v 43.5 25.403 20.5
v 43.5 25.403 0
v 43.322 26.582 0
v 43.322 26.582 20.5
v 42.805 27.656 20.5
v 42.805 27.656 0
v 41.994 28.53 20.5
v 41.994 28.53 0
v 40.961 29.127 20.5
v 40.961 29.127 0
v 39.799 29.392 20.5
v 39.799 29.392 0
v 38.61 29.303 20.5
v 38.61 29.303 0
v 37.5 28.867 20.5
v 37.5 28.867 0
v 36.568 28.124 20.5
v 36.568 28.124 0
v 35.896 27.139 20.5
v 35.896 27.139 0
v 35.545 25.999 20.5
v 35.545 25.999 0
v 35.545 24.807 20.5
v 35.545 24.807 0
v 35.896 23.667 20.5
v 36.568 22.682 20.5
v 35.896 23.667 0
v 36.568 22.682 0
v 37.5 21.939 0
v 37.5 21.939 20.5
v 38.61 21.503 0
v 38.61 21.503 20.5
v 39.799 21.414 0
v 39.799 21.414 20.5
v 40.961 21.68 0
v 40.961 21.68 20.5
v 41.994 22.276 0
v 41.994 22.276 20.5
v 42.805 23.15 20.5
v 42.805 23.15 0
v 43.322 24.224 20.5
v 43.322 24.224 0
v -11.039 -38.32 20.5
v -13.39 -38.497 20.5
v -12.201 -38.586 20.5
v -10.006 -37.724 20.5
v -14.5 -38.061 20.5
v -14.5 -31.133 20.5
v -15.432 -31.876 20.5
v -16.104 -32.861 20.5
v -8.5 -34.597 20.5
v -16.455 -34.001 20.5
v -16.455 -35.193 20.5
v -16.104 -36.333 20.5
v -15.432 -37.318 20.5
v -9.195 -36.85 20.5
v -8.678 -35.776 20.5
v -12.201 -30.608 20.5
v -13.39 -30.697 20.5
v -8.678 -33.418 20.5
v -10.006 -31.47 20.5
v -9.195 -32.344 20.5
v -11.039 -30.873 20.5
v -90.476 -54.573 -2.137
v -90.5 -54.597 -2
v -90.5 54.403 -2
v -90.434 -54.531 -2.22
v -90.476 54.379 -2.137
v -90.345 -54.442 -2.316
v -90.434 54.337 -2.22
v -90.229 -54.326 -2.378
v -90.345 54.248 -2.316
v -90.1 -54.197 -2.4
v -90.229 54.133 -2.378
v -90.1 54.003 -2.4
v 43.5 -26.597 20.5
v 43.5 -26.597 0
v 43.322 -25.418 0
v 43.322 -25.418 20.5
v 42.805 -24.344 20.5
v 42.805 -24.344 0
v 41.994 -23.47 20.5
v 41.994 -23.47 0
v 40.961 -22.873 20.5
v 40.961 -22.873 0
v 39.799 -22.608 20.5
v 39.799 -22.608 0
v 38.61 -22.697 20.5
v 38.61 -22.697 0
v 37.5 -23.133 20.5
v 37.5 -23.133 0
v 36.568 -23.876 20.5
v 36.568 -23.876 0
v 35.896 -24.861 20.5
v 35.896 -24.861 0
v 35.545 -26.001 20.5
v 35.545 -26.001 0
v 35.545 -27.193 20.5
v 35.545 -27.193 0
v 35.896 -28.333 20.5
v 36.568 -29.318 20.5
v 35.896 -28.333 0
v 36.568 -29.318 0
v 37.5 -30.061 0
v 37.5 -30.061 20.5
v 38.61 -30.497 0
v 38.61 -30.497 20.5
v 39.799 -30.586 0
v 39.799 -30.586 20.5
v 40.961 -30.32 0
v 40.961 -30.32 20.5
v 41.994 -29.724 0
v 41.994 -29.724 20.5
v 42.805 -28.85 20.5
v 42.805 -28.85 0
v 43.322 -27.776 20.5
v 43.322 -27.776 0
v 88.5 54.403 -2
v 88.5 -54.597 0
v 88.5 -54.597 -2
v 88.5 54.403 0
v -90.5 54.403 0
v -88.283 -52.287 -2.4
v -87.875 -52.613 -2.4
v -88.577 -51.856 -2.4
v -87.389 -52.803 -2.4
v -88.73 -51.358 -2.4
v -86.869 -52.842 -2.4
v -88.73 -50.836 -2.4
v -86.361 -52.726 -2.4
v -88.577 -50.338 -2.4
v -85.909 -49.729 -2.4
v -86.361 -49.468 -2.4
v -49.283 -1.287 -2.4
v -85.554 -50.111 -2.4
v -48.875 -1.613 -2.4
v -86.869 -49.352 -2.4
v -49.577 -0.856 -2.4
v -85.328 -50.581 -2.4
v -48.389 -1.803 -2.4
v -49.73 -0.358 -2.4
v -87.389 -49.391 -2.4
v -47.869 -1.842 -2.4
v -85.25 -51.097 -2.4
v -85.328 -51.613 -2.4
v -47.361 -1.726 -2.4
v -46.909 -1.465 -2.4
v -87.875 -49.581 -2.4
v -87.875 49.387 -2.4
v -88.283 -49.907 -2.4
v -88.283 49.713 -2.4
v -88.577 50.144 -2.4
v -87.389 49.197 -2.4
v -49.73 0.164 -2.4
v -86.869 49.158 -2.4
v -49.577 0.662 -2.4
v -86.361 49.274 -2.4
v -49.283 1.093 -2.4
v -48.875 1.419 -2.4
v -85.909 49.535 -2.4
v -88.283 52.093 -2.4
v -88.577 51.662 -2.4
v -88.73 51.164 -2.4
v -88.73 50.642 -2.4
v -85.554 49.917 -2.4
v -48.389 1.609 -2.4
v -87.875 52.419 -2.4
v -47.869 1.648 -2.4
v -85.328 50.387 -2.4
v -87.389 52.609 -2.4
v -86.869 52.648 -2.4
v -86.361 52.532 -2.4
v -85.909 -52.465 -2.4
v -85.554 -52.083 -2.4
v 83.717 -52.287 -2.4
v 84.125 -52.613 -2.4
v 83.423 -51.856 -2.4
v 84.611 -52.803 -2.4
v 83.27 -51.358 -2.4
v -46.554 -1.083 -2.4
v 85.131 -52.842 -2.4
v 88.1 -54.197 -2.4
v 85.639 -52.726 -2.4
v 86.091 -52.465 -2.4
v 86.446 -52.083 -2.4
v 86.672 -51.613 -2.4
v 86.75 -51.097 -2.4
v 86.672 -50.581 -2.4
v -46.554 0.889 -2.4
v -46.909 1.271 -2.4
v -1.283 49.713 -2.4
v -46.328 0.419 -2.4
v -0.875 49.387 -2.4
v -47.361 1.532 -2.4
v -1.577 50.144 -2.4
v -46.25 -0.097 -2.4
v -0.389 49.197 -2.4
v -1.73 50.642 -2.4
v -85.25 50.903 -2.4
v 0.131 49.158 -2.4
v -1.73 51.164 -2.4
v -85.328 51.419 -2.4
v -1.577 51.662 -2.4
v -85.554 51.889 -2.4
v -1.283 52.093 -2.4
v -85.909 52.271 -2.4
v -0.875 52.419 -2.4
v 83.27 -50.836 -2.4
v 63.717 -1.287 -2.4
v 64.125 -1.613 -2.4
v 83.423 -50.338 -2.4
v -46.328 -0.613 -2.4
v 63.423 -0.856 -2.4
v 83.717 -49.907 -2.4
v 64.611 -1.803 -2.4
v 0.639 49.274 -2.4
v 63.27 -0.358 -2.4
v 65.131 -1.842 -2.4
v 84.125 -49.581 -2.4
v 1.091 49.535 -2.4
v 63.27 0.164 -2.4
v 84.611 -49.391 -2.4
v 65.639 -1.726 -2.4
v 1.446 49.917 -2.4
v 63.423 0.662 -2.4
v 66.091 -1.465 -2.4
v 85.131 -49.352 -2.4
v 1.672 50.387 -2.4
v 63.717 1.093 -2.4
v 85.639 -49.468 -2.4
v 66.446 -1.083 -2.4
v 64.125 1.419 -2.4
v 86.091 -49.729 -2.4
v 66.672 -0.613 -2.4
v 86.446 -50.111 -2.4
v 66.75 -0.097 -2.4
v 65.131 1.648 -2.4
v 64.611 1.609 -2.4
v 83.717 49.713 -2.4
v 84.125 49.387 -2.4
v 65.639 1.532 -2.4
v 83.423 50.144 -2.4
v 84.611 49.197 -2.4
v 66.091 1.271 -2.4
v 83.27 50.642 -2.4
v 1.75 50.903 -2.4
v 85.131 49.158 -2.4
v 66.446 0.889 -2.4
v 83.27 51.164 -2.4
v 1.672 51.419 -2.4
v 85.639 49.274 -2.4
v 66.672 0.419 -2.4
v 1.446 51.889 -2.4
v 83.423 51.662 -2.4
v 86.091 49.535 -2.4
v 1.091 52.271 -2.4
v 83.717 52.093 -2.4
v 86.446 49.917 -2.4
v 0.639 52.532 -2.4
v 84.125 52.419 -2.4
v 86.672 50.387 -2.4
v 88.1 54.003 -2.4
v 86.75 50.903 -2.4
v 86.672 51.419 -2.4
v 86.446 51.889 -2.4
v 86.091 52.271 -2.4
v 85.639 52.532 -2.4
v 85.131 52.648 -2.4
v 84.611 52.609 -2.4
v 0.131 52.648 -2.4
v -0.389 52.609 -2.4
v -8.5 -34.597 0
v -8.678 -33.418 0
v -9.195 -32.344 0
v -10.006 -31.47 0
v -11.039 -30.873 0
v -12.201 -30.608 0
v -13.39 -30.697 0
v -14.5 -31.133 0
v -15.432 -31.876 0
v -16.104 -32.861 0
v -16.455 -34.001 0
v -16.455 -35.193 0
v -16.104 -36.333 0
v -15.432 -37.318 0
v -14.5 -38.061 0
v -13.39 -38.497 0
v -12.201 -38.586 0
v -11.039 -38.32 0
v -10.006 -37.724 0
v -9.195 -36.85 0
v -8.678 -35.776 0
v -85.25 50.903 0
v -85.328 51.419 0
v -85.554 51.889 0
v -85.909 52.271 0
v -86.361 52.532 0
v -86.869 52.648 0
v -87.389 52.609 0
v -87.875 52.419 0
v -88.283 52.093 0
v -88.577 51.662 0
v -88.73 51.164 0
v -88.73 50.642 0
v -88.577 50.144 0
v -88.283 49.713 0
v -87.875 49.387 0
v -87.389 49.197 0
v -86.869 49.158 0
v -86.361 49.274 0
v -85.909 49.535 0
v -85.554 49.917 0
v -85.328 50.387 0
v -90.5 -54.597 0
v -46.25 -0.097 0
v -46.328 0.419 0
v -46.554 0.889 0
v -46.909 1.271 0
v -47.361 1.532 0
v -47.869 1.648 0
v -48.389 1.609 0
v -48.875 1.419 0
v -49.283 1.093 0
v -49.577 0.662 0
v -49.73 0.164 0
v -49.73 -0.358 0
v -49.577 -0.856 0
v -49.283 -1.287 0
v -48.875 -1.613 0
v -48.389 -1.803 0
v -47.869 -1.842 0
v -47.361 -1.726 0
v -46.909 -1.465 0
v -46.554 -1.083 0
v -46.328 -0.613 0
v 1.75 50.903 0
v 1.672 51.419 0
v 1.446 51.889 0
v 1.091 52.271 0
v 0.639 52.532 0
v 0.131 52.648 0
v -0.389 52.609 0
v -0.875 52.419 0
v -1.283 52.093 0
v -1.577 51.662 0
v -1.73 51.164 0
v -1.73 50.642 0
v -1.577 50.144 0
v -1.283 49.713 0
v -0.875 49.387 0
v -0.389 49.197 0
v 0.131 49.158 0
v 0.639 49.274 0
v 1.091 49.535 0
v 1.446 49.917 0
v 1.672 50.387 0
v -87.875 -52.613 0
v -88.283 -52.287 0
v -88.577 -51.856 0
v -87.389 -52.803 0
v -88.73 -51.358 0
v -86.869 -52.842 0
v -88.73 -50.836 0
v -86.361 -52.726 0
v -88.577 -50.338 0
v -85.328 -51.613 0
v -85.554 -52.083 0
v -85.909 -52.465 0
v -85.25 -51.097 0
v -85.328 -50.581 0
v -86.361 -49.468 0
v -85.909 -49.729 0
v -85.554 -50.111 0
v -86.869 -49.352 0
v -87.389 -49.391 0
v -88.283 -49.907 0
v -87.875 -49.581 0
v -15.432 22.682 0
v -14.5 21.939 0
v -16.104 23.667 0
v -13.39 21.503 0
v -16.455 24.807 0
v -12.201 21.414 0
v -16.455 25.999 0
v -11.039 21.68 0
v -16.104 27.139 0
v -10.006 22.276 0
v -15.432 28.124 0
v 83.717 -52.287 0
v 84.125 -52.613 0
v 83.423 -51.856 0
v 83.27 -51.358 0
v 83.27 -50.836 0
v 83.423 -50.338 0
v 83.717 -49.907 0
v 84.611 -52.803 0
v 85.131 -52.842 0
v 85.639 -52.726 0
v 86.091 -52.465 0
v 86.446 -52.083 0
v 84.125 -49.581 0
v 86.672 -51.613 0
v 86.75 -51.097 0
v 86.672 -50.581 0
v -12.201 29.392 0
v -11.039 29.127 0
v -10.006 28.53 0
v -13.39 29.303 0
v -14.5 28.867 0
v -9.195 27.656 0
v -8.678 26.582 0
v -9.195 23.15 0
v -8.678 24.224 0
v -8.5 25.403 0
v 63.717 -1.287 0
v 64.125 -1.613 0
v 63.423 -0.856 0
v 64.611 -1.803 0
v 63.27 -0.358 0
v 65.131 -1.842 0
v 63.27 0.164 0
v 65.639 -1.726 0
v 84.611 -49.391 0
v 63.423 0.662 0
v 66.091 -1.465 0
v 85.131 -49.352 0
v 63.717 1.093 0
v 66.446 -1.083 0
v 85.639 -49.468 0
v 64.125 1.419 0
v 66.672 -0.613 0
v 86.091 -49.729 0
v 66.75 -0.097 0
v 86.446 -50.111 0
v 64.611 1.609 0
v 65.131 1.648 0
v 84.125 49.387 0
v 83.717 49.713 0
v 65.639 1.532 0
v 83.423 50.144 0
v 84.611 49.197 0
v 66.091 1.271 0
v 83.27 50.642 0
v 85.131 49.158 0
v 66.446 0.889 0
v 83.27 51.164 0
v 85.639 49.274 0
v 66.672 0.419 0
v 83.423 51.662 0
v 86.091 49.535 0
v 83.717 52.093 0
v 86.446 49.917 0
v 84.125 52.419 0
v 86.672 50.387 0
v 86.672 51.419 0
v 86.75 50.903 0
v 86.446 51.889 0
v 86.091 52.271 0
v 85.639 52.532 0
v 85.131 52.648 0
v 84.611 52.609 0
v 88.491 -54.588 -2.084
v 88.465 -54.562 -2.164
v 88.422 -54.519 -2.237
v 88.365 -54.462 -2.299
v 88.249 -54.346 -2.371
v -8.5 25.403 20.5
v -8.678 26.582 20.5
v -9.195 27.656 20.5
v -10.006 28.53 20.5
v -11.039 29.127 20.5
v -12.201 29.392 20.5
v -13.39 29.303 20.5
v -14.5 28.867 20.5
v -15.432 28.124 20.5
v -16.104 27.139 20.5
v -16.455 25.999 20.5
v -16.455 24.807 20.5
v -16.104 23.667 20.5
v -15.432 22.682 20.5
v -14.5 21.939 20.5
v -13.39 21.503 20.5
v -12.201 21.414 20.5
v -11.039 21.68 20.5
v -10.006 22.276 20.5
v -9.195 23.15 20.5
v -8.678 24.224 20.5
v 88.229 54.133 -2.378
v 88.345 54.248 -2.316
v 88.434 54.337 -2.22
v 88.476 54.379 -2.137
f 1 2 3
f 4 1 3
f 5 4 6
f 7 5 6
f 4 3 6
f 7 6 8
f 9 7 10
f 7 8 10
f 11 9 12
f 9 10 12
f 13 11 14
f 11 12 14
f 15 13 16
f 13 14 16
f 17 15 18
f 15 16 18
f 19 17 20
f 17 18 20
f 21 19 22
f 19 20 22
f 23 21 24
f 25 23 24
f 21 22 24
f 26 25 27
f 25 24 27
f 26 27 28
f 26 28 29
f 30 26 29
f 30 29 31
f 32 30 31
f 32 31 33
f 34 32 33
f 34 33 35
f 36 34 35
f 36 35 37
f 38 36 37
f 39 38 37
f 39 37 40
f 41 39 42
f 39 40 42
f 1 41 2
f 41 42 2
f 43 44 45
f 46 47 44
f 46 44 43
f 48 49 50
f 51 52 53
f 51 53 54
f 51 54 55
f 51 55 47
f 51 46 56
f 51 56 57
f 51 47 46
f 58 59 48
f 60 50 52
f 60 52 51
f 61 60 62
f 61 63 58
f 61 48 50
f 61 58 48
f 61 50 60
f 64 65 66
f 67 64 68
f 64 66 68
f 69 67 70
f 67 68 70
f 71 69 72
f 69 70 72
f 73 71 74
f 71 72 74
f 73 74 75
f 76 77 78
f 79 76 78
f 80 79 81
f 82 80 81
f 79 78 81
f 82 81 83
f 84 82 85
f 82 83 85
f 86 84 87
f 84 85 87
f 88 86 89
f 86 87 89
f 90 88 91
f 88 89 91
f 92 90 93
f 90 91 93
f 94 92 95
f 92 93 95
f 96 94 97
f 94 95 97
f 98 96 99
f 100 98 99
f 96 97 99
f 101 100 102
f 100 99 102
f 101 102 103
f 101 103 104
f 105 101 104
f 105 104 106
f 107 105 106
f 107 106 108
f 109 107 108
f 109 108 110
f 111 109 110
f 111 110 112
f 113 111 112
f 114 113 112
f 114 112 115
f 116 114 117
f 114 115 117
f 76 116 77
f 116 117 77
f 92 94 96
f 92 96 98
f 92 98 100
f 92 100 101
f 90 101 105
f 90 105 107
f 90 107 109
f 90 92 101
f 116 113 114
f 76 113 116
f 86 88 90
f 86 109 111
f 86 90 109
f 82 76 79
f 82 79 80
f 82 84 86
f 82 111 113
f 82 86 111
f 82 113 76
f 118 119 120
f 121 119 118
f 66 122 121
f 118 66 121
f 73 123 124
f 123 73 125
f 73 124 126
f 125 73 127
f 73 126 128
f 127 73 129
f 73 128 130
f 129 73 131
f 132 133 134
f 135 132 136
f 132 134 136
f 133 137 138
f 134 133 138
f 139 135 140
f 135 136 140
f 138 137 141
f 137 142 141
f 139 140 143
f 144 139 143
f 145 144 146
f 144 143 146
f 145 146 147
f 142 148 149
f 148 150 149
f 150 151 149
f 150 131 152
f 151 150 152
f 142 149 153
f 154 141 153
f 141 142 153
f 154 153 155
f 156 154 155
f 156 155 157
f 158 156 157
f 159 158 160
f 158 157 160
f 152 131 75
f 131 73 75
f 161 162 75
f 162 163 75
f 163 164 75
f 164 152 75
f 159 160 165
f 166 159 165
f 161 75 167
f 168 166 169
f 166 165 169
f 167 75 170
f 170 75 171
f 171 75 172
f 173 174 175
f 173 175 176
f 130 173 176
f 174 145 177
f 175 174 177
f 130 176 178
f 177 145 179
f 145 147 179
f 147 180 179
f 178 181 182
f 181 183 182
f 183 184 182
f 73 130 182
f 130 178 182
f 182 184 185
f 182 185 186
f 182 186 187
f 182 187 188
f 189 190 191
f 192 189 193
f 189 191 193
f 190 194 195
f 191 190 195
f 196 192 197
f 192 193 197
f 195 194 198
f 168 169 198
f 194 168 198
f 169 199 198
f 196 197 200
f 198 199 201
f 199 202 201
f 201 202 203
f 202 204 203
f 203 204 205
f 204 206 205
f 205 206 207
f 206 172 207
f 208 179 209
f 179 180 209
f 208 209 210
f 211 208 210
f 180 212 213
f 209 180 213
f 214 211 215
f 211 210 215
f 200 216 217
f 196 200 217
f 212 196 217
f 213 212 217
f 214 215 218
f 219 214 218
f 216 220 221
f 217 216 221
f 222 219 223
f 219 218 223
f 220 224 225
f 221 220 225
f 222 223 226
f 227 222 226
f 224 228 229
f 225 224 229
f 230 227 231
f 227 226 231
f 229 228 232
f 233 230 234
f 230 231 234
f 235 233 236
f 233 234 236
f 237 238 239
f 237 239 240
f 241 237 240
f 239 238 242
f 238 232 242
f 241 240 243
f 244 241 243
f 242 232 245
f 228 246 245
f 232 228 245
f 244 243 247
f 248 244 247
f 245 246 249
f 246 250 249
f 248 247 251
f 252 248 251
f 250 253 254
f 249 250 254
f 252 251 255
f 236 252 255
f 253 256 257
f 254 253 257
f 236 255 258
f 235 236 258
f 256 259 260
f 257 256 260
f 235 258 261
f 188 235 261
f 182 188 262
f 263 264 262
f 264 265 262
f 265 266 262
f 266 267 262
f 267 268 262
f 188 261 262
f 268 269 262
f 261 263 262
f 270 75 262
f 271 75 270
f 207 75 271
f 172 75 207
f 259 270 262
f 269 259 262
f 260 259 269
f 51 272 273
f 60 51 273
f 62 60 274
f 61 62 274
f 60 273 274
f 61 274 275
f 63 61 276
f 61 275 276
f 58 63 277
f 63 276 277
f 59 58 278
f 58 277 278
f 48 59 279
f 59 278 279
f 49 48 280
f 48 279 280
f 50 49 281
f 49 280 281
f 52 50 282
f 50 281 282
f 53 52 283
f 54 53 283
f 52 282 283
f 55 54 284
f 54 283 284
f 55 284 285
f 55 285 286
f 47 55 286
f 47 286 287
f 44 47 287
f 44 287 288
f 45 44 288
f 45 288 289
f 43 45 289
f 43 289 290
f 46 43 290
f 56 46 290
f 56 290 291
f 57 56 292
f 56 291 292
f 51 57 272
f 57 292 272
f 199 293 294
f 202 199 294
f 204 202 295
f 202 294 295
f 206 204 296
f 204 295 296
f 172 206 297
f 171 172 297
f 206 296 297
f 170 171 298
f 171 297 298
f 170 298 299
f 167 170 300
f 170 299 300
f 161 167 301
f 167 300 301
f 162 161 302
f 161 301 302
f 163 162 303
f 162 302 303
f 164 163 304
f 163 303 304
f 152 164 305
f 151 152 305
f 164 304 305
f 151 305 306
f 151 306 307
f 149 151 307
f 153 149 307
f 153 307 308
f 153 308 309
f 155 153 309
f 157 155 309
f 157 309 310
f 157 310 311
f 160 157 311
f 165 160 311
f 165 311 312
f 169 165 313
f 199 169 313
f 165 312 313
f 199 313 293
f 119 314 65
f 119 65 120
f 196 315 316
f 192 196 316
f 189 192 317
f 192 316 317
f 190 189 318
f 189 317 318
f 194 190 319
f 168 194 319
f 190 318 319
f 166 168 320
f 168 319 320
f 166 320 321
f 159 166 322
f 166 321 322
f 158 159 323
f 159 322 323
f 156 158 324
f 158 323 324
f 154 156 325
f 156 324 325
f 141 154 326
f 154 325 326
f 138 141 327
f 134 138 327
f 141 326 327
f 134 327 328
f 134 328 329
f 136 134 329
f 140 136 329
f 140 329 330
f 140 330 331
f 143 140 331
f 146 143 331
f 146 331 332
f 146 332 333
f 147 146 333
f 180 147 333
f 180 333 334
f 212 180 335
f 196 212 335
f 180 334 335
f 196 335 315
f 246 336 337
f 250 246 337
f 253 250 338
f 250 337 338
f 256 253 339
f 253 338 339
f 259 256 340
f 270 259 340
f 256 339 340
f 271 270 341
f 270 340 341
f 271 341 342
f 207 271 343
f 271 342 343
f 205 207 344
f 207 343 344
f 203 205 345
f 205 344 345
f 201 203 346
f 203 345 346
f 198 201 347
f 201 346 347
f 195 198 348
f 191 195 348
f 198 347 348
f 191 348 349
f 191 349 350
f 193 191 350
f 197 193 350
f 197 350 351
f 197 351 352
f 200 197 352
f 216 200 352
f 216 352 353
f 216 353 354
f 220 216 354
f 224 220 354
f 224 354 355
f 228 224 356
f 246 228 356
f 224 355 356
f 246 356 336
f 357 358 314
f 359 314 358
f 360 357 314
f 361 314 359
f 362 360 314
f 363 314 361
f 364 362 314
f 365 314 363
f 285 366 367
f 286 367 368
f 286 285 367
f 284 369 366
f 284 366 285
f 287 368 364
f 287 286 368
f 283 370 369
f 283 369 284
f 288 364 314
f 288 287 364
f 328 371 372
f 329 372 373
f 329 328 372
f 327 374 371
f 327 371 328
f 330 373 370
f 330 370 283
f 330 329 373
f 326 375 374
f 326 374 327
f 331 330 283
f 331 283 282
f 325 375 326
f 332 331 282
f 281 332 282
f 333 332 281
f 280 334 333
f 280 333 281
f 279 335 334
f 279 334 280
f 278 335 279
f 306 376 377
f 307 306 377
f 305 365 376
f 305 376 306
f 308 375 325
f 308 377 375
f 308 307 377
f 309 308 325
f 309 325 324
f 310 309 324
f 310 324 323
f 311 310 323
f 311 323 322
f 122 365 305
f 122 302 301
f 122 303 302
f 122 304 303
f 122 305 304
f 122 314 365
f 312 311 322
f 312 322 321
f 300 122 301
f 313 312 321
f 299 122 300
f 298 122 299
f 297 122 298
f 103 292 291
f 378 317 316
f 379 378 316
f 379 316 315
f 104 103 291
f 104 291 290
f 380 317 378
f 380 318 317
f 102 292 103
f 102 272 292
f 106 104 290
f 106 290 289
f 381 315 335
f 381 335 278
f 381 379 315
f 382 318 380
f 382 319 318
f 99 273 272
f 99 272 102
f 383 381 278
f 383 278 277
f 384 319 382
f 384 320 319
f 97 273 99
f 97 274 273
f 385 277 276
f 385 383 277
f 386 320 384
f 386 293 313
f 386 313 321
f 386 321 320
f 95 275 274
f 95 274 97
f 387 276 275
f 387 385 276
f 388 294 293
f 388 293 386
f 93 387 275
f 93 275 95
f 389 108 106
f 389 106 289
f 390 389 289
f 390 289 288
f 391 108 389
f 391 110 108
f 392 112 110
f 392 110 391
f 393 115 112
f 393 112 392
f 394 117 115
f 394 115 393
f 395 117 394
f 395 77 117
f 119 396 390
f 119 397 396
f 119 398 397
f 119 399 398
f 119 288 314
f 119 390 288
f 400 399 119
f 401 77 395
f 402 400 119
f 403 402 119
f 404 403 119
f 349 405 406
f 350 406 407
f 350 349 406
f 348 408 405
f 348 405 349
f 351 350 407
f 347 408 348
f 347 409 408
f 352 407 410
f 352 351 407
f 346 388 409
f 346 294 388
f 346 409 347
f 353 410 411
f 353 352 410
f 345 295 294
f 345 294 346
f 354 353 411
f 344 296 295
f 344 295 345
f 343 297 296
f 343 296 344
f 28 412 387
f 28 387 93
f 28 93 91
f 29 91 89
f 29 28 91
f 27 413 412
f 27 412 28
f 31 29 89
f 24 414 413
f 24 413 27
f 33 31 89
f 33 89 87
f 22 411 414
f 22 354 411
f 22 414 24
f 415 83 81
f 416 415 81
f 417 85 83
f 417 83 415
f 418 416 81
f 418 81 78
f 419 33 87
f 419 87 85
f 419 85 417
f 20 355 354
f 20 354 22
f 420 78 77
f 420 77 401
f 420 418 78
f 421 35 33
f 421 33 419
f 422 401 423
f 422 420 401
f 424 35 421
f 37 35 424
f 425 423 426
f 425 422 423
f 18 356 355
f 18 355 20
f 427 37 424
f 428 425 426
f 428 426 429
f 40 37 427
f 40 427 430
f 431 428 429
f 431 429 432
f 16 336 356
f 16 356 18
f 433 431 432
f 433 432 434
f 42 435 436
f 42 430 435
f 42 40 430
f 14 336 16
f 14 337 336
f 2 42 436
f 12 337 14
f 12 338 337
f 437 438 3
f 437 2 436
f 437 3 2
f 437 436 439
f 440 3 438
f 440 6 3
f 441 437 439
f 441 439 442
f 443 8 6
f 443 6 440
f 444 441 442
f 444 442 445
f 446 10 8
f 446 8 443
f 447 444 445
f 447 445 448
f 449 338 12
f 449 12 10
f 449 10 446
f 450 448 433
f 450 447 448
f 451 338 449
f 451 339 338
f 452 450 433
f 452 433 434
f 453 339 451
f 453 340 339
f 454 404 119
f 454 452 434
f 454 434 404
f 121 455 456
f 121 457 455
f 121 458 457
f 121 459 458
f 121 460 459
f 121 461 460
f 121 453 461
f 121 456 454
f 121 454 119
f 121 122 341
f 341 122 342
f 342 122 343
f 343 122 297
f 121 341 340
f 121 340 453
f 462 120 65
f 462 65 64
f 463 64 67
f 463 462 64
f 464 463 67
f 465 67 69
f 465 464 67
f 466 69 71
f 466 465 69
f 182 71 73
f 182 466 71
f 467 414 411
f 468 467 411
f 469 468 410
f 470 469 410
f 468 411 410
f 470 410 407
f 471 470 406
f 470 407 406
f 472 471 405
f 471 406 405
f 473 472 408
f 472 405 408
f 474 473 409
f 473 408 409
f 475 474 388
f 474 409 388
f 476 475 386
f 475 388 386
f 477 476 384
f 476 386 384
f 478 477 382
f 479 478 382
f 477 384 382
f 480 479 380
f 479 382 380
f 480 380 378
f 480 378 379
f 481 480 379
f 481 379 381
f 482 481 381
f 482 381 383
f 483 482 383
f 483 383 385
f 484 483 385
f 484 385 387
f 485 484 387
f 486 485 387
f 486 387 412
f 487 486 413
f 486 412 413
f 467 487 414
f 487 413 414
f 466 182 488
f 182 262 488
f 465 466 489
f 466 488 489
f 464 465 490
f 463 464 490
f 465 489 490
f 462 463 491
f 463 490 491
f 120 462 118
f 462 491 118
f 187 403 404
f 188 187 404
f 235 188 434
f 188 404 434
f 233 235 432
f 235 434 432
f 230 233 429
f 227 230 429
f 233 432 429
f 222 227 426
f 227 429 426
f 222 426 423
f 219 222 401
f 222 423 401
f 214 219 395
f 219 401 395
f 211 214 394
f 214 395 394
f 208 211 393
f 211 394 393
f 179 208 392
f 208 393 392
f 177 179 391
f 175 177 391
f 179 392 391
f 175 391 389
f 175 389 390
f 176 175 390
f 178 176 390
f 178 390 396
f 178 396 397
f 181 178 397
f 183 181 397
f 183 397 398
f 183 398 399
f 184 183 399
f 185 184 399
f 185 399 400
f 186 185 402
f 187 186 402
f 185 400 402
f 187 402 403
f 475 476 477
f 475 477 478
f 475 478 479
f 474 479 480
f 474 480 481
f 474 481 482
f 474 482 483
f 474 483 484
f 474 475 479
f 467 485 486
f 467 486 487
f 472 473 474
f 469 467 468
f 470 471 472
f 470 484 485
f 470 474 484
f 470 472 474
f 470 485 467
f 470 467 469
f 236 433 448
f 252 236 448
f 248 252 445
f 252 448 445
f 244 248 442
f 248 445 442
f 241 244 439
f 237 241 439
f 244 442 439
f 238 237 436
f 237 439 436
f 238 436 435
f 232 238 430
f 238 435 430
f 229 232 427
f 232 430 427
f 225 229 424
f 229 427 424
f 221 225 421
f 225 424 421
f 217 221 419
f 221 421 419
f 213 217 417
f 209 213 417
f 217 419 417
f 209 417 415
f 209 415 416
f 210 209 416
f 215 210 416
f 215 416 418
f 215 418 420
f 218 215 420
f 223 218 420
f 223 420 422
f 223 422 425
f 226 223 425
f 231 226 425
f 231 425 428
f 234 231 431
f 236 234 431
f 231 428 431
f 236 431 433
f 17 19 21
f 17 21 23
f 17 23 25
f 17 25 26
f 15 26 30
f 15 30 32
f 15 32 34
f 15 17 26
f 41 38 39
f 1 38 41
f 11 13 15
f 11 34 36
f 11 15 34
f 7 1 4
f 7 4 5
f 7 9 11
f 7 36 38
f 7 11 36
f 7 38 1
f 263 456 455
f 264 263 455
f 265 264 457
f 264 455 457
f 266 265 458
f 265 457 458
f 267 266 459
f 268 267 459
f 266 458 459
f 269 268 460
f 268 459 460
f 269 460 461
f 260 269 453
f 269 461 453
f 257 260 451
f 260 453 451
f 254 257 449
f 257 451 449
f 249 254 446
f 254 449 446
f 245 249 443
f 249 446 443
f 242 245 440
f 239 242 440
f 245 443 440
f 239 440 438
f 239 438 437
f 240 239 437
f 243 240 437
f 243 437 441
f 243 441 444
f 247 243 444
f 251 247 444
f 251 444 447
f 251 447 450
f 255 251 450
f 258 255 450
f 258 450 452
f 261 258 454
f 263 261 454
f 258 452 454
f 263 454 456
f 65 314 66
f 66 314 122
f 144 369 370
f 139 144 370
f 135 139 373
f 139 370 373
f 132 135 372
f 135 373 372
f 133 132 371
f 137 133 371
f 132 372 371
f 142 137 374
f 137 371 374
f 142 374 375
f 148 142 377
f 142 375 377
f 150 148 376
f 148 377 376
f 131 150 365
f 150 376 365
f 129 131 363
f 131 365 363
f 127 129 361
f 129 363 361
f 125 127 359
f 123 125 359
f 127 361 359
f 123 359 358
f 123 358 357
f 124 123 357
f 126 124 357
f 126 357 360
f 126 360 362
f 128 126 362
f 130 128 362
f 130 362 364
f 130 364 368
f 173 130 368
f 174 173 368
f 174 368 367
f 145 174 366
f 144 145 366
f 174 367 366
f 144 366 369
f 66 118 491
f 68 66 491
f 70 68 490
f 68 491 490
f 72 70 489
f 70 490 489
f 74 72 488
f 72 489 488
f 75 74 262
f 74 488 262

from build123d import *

# Parameters (mm, degrees)
F0_W     = 179
F0_H     = 109
F0_R     = 1.75
F0_R_2   = 4
F1_DEPTH = 2.4
F2_DEPTH = 20.5
F3_R     = 0.4


with BuildPart() as f1:
    # F0 (on Top) → F1 (new body)
    with BuildSketch(Plane.XY):
        with Locations((-1, -0.096982)):
            Rectangle(F0_W, F0_H)
        with Locations((-87, -51.096982)):
            Circle(F0_R, mode=Mode.SUBTRACT)
        with Locations((-12.5, -34.596982)):
            Circle(F0_R_2, mode=Mode.SUBTRACT)
        with Locations((85, -51.096982)):
            Circle(F0_R, mode=Mode.SUBTRACT)
        with Locations((39.5, -26.596982)):
            Circle(F0_R_2, mode=Mode.SUBTRACT)
        with Locations((-48, -0.096982)):
            Circle(F0_R, mode=Mode.SUBTRACT)
        with Locations((-12.5, 25.403018)):
            Circle(F0_R_2, mode=Mode.SUBTRACT)
        with Locations((-87, 50.903018)):
            Circle(F0_R, mode=Mode.SUBTRACT)
        with Locations((39.5, 25.403018)):
            Circle(F0_R_2, mode=Mode.SUBTRACT)
        with Locations((65, -0.096982)):
            Circle(F0_R, mode=Mode.SUBTRACT)
        with Locations((0, 50.903018)):
            Circle(F0_R, mode=Mode.SUBTRACT)
        with Locations((85, 50.903018)):
            Circle(F0_R, mode=Mode.SUBTRACT)
        with Locations((-12.5, 25.403018)):
            Circle(F0_R_2)
        with Locations((39.5, 25.403018)):
            Circle(F0_R_2)
        with Locations((-12.5, -34.596982)):
            Circle(F0_R_2)
        with Locations((39.5, -26.596982)):
            Circle(F0_R_2)
    extrude(amount=-F1_DEPTH)

    # F0 (on Top) → F2 (join)
    with BuildSketch(Plane.XY):
        with Locations((-12.5, 25.403018)):
            Circle(F0_R_2)
        with Locations((-12.5, -34.596982)):
            Circle(F0_R_2)
        with Locations((39.5, -26.596982)):
            Circle(F0_R_2)
        with Locations((39.5, 25.403018)):
            Circle(F0_R_2)
    extrude(amount=F2_DEPTH)

    # F3
    f3_edges = [f1.edges().sort_by_distance(p)[0] for p in [
        (-1, 54.403018, -2.4),
        (-90.5, -0.096982, -2.4),
        (88.5, -0.096982, -2.4),
        (-1, -54.596982, -2.4),
    ]]
    fillet(f3_edges, radius=F3_R)


solid = f1.part
